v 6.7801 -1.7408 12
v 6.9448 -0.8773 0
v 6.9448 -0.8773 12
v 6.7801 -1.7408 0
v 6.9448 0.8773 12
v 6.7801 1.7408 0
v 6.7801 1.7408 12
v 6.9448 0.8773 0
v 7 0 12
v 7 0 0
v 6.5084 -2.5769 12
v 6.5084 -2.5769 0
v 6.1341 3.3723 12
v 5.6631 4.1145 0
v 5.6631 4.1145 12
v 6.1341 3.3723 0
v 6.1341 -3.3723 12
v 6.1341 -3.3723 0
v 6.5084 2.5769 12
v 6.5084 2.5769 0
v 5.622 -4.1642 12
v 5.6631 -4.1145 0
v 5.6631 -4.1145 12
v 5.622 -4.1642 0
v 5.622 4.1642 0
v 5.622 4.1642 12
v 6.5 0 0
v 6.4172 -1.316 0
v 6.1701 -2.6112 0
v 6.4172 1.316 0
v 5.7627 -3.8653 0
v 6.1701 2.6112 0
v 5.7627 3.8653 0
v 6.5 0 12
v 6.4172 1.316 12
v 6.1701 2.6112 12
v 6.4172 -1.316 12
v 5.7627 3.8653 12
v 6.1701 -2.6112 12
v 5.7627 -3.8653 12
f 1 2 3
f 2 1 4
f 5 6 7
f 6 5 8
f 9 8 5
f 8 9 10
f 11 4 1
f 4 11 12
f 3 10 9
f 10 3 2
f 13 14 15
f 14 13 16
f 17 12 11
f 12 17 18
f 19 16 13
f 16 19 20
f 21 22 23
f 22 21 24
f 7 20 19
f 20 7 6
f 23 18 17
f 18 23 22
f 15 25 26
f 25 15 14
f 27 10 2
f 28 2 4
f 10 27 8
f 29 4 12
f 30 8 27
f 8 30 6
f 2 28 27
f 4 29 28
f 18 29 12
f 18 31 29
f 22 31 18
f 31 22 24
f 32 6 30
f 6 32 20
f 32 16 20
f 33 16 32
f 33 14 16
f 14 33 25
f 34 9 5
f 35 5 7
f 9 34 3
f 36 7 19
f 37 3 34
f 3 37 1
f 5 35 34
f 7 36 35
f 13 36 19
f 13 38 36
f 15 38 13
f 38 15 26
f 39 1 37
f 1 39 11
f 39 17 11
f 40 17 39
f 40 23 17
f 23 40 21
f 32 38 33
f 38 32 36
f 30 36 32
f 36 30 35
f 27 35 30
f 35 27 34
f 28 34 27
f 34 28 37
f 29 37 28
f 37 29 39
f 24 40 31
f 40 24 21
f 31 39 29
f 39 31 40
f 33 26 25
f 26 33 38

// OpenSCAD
$fn = 50;


difference() {
	union() {
		cylinder(h = 12, r = 7.0000000000);
		translate(v = [-7.0000000000, 0, 0]) {
			cylinder(h = 12, r = 7.0000000000);
		}
	}
	union() {
		cylinder(h = 12, r = 3.2500000000);
		cylinder(h = 12, r = 1.8000000000);
		cylinder(h = 12, r = 1.8000000000);
		cylinder(h = 12, r = 1.8000000000);
		translate(v = [-11.5000000000, 0, 0]) {
			hull() {
				translate(v = [-3.7500000000, 0.0000000000, 0]) {
					cylinder(h = 12, r = 10.5000000000);
				}
				translate(v = [3.7500000000, 0.0000000000, 0]) {
					cylinder(h = 12, r = 10.5000000000);
				}
				translate(v = [-3.7500000000, -0.0000000000, 0]) {
					cylinder(h = 12, r = 10.5000000000);
				}
				translate(v = [3.7500000000, -0.0000000000, 0]) {
					cylinder(h = 12, r = 10.5000000000);
				}
			}
		}
		translate(v = [-4.0000000000, 0, 0.0000000000]) {
			cylinder(h = 12, r = 10.5000000000);
		}
	}
}
